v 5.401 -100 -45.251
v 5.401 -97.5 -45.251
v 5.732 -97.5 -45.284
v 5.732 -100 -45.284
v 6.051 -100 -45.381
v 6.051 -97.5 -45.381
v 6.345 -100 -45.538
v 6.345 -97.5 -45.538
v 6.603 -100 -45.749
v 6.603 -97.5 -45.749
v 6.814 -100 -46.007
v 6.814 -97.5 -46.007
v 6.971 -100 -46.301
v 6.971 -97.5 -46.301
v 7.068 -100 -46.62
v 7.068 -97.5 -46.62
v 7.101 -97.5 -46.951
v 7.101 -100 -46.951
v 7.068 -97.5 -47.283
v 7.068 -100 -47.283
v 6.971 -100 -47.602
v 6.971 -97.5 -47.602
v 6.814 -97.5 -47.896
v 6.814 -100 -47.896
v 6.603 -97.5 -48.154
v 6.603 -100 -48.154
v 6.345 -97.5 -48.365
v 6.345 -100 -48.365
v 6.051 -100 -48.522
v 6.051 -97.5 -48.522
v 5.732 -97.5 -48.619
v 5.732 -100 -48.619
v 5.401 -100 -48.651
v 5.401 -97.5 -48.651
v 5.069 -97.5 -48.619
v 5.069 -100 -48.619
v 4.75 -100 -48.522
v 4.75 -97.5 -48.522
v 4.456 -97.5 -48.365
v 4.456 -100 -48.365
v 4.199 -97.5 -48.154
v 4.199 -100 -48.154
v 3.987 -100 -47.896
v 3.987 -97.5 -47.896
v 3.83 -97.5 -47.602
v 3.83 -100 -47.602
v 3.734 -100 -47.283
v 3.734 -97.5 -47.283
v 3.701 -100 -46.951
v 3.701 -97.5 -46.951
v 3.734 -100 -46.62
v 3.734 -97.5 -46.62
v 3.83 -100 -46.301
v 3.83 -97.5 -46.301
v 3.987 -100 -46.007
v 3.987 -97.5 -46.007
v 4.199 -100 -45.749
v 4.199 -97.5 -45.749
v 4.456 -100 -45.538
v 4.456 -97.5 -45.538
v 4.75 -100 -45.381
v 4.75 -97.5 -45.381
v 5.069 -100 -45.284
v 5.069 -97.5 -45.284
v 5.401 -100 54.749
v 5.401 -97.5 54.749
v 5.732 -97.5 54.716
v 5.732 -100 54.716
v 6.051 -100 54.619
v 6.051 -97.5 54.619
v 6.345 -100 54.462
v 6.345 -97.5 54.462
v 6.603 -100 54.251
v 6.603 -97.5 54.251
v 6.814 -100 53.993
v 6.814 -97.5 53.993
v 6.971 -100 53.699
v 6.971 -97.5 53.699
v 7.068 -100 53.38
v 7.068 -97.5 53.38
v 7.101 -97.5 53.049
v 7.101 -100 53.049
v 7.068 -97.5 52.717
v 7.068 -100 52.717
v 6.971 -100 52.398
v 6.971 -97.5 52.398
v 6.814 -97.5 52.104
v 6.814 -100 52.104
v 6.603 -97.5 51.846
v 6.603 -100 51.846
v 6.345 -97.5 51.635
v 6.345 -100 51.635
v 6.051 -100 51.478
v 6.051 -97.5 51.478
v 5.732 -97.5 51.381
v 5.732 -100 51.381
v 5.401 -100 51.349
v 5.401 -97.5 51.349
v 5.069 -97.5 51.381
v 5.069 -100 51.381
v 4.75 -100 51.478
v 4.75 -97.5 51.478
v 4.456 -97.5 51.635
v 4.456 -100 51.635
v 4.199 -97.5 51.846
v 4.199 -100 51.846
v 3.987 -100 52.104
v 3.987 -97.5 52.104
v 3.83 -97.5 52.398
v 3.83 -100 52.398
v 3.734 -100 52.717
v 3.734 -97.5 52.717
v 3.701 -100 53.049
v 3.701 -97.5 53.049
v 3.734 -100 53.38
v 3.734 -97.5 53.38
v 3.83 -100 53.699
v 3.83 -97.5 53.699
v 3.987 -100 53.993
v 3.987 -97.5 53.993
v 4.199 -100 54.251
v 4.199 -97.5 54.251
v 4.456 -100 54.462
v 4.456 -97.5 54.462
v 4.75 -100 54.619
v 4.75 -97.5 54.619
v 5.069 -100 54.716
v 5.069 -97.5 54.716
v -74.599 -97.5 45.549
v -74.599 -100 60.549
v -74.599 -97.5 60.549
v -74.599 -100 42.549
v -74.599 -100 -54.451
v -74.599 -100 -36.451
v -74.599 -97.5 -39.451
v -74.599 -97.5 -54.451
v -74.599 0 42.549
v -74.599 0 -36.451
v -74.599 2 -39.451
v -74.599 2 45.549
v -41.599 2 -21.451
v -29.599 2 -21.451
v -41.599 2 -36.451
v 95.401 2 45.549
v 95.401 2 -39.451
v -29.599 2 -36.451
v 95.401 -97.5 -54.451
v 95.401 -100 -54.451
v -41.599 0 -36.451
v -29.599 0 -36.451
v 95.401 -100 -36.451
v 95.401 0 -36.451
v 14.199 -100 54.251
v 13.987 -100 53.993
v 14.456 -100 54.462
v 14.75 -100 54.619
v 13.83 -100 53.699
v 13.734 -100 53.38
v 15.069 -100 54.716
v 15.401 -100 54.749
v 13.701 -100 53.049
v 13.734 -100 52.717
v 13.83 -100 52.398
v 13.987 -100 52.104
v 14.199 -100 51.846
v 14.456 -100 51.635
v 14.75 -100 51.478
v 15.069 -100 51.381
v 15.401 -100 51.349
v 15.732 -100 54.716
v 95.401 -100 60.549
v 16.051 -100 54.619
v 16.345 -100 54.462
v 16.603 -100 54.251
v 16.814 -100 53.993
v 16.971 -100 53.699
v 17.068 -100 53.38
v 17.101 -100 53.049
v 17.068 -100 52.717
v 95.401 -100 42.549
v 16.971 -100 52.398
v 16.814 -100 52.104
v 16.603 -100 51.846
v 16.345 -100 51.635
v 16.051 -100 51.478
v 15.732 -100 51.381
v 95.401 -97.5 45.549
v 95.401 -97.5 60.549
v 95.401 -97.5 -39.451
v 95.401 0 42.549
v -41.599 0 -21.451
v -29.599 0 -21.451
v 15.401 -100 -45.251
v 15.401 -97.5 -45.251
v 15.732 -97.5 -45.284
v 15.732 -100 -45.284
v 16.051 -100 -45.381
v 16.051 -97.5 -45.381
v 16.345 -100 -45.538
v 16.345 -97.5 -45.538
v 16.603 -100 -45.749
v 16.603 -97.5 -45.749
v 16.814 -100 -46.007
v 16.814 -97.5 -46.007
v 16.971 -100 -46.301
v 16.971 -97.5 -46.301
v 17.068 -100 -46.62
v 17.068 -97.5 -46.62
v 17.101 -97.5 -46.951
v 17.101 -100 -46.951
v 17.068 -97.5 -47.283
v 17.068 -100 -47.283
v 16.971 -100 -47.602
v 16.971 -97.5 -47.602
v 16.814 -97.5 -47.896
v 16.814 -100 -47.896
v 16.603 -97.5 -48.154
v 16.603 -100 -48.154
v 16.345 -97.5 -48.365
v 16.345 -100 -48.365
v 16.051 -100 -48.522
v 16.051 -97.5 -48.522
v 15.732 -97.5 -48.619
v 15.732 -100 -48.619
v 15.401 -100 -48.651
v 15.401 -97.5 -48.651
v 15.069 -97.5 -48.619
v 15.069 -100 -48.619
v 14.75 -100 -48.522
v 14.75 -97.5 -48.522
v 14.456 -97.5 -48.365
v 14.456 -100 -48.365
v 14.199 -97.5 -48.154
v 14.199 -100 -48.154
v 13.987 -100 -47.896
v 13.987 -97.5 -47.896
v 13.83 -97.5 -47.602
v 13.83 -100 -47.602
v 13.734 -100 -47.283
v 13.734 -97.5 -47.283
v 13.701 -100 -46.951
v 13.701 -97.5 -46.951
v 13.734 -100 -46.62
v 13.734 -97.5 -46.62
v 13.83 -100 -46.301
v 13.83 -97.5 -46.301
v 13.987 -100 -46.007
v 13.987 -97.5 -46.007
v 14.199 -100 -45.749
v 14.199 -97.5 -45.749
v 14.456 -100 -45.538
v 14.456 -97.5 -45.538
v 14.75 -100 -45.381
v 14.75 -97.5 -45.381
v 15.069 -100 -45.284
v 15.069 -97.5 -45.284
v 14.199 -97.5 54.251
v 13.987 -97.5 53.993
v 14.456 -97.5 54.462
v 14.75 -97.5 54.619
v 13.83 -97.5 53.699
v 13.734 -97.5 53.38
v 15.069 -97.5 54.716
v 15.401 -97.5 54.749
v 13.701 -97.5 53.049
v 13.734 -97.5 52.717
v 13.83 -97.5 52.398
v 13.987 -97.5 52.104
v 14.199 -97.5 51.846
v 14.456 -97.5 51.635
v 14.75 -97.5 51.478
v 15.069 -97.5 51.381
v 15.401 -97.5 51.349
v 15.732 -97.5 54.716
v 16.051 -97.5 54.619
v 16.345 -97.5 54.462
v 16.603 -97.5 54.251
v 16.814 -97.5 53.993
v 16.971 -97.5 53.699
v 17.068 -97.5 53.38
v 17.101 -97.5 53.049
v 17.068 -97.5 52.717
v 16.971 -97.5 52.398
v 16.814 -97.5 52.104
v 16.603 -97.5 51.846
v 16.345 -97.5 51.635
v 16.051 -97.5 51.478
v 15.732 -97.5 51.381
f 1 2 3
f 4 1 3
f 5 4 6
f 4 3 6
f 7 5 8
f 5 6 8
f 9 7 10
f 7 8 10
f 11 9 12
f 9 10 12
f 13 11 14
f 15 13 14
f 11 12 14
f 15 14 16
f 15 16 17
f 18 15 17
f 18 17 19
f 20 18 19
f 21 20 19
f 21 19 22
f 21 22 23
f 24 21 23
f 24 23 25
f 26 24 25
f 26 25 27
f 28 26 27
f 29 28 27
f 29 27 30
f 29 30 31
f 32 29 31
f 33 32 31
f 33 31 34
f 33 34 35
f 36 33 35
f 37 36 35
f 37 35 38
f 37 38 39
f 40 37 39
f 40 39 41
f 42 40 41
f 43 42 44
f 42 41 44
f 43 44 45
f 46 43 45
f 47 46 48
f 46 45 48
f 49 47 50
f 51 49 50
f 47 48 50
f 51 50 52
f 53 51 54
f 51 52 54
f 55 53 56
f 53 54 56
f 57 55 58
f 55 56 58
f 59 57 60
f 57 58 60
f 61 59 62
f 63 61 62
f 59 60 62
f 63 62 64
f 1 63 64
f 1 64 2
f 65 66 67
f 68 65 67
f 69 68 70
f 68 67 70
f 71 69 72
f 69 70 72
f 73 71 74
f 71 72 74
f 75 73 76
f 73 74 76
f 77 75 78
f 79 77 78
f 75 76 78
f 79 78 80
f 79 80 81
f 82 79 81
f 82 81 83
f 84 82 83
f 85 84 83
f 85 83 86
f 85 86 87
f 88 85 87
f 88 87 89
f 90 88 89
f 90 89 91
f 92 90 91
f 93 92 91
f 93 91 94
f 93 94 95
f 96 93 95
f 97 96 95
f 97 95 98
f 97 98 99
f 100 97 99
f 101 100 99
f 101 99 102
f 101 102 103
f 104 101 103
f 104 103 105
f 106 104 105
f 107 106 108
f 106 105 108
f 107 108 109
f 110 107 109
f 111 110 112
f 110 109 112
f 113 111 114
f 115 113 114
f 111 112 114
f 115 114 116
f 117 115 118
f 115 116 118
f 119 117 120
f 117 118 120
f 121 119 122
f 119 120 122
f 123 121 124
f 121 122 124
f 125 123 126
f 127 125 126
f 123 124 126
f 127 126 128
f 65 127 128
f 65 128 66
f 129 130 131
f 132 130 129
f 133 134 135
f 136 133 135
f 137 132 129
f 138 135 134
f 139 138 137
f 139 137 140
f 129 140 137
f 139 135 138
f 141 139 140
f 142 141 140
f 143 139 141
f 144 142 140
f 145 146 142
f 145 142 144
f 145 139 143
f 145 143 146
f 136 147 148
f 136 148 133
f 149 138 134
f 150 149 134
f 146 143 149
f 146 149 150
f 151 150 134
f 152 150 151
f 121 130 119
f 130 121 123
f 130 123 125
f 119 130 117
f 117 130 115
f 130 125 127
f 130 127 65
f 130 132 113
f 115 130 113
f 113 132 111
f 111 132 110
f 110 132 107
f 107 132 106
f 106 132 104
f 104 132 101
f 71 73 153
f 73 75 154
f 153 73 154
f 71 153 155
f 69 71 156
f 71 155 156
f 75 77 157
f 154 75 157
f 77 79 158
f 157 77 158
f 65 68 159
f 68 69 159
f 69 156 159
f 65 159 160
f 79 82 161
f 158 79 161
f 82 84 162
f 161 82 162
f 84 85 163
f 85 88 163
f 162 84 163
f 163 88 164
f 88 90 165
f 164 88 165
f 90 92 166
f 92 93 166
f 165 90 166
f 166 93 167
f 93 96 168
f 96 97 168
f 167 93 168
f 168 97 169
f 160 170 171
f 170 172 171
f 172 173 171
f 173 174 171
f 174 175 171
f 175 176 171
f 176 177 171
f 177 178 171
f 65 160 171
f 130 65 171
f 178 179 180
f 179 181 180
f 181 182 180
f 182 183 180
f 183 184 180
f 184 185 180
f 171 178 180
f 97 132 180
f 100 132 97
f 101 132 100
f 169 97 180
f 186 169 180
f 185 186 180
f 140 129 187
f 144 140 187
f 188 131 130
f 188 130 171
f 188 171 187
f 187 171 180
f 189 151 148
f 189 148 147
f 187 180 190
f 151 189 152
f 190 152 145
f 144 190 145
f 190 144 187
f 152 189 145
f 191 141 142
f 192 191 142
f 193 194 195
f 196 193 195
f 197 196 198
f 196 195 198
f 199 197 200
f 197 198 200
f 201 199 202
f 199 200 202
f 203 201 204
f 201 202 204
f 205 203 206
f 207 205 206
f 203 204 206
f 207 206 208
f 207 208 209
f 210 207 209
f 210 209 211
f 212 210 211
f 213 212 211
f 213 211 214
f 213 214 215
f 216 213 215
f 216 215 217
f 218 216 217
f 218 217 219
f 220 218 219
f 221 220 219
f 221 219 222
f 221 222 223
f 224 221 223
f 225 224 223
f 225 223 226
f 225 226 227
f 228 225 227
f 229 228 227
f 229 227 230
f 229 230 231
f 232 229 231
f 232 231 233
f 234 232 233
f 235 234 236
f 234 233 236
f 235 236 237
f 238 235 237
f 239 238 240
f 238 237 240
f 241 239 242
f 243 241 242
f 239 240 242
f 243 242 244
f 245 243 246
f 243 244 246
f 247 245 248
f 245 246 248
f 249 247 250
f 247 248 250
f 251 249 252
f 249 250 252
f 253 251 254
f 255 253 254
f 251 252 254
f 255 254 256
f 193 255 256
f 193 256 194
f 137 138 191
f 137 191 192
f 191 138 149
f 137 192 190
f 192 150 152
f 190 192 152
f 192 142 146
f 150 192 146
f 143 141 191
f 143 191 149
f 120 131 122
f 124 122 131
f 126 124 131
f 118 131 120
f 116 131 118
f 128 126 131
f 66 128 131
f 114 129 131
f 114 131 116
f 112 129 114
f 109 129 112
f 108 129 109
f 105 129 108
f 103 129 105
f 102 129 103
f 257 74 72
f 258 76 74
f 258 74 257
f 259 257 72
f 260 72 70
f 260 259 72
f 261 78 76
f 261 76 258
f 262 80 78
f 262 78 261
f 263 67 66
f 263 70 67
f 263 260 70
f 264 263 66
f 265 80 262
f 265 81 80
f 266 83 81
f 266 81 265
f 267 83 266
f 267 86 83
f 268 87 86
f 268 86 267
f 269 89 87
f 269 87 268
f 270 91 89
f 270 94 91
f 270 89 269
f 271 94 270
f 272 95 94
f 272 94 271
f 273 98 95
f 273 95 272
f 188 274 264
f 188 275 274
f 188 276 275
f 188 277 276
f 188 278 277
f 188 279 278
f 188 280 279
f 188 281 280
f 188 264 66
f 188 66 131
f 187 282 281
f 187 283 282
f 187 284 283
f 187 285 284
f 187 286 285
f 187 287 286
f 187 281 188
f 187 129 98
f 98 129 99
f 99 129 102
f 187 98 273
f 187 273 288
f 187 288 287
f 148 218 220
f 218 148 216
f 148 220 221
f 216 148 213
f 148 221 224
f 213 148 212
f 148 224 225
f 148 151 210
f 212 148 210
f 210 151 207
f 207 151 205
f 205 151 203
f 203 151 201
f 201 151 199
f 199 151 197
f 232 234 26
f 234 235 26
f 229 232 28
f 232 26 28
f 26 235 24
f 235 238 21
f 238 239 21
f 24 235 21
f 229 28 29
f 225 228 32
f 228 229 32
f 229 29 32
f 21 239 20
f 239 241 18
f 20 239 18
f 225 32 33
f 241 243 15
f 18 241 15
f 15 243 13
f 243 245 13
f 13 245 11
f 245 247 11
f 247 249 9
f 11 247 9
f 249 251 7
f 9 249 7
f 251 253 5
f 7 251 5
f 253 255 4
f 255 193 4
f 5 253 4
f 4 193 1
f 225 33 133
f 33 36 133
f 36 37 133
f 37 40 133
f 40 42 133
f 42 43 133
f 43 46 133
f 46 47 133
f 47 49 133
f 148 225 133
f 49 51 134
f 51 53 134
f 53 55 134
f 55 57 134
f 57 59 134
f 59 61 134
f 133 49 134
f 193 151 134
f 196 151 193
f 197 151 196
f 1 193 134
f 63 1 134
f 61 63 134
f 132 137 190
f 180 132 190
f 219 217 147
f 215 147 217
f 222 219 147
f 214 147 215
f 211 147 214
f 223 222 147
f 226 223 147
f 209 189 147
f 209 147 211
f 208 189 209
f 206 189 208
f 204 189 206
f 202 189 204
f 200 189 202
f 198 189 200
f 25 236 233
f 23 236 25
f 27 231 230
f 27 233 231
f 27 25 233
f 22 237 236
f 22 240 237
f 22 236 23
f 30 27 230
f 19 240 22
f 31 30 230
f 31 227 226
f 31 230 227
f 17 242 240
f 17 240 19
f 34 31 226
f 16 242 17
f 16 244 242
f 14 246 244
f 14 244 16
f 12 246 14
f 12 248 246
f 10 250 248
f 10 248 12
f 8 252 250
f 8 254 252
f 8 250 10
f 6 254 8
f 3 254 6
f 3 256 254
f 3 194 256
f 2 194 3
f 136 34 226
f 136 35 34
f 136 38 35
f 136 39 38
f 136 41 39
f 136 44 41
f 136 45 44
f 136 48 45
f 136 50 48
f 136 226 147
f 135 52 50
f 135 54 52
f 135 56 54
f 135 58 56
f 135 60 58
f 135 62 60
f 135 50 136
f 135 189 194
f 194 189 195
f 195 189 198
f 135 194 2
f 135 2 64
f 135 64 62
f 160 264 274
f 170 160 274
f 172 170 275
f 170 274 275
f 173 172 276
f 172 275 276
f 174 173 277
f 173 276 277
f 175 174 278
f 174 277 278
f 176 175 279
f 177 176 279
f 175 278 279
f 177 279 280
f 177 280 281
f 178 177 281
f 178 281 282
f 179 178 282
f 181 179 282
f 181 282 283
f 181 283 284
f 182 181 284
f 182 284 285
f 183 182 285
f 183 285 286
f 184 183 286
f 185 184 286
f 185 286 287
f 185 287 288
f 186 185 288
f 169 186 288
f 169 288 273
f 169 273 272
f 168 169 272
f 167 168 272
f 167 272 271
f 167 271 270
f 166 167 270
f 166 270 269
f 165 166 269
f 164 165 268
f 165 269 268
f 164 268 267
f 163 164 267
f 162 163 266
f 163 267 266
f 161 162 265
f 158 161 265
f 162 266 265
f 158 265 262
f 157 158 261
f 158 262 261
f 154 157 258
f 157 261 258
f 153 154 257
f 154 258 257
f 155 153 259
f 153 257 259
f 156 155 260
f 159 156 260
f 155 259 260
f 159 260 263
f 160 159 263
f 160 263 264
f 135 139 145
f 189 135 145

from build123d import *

# Parameters (mm, degrees)
SKETCH2_W           = 170
SKETCH2_H           = 85
BOSS_EXTRUDE1_DEPTH = 2
SKETCH3_W           = 12
SKETCH3_H           = 15
CUT_EXTRUDE1_DEPTH  = 106.73546699
SKETCH6_W           = 170
SKETCH6_H           = 3
BOSS_EXTRUDE2_DEPTH = 100
SKETCH7_W           = 170
SKETCH7_H           = 2.5
BOSS_EXTRUDE3_DEPTH = 15
SKETCH8_W           = 170
SKETCH8_H           = 2.5
BOSS_EXTRUDE4_DEPTH = 15
SKETCH9_R           = 1.7
CUT_EXTRUDE3_DEPTH  = 151.557944579
SKETCH11_R          = 1.7
CUT_EXTRUDE4_DEPTH  = 151.557944579


with BuildPart() as part:
    # Sketch2 → Boss-Extrude1 (new body)
    with BuildSketch(Plane(origin=(0, 0, 0), x_dir=(1, 0, 0), z_dir=(0, 1, 0))):
        with Locations((10.400843882, -3.048523207)):
            Rectangle(SKETCH2_W, SKETCH2_H)
    extrude(amount=BOSS_EXTRUDE1_DEPTH)

    # Sketch3 → Cut-Extrude1 (cut, through all)
    with BuildSketch(Plane(origin=(0, 2, 0), x_dir=(1, 0, 0), z_dir=(0, 1, 0))):
        with Locations((-35.599156118, 28.951476793)):
            Rectangle(SKETCH3_W, SKETCH3_H)
    extrude(amount=-CUT_EXTRUDE1_DEPTH, mode=Mode.SUBTRACT)

    # Sketch6 → Boss-Extrude2 (add)
    with BuildSketch(Plane.XZ):
        with Locations((10.400843882, -37.951476793)):
            Rectangle(SKETCH6_W, SKETCH6_H)
        with Locations((10.400843882, 44.048523207)):
            Rectangle(SKETCH6_W, SKETCH6_H)
    extrude(amount=BOSS_EXTRUDE2_DEPTH)

    # Sketch7 → Boss-Extrude3 (add)
    with BuildSketch(Plane(origin=(0, 0, -39.451476793), x_dir=(-1, 0, 0), z_dir=(0, 0, -1))):
        with Locations((-10.400843882, -98.75)):
            Rectangle(SKETCH7_W, SKETCH7_H)
    extrude(amount=BOSS_EXTRUDE3_DEPTH)

    # Sketch8 → Boss-Extrude4 (add)
    with BuildSketch(Plane.XY.offset(45.548523207)):
        with Locations((10.400843882, -98.75)):
            Rectangle(SKETCH8_W, SKETCH8_H)
    extrude(amount=BOSS_EXTRUDE4_DEPTH)

    # Sketch9 → Cut-Extrude3 (cut, through all)
    with BuildSketch(Plane(origin=(0, -97.5, 0), x_dir=(1, 0, 0), z_dir=(0, 1, 0))):
        with Locations(Location((5.400843882, -53.048523207, 0), (0, 0, 270))):
            Circle(SKETCH9_R)
        with Locations(Location((15.400843882, -53.048523207, 0), (0, 0, 270))):
            Circle(SKETCH9_R)
    extrude(amount=-CUT_EXTRUDE3_DEPTH, mode=Mode.SUBTRACT)

    # Sketch11 → Cut-Extrude4 (cut, through all)
    with BuildSketch(Plane(origin=(0, -97.5, 0), x_dir=(1, 0, 0), z_dir=(0, 1, 0))):
        with Locations(Location((5.400843882, 46.951476793, 0), (0, 0, 270))):
            Circle(SKETCH11_R)
        with Locations(Location((15.400843882, 46.951476793, 0), (0, 0, 270))):
            Circle(SKETCH11_R)
    extrude(amount=-CUT_EXTRUDE4_DEPTH, mode=Mode.SUBTRACT)


solid = part.part
